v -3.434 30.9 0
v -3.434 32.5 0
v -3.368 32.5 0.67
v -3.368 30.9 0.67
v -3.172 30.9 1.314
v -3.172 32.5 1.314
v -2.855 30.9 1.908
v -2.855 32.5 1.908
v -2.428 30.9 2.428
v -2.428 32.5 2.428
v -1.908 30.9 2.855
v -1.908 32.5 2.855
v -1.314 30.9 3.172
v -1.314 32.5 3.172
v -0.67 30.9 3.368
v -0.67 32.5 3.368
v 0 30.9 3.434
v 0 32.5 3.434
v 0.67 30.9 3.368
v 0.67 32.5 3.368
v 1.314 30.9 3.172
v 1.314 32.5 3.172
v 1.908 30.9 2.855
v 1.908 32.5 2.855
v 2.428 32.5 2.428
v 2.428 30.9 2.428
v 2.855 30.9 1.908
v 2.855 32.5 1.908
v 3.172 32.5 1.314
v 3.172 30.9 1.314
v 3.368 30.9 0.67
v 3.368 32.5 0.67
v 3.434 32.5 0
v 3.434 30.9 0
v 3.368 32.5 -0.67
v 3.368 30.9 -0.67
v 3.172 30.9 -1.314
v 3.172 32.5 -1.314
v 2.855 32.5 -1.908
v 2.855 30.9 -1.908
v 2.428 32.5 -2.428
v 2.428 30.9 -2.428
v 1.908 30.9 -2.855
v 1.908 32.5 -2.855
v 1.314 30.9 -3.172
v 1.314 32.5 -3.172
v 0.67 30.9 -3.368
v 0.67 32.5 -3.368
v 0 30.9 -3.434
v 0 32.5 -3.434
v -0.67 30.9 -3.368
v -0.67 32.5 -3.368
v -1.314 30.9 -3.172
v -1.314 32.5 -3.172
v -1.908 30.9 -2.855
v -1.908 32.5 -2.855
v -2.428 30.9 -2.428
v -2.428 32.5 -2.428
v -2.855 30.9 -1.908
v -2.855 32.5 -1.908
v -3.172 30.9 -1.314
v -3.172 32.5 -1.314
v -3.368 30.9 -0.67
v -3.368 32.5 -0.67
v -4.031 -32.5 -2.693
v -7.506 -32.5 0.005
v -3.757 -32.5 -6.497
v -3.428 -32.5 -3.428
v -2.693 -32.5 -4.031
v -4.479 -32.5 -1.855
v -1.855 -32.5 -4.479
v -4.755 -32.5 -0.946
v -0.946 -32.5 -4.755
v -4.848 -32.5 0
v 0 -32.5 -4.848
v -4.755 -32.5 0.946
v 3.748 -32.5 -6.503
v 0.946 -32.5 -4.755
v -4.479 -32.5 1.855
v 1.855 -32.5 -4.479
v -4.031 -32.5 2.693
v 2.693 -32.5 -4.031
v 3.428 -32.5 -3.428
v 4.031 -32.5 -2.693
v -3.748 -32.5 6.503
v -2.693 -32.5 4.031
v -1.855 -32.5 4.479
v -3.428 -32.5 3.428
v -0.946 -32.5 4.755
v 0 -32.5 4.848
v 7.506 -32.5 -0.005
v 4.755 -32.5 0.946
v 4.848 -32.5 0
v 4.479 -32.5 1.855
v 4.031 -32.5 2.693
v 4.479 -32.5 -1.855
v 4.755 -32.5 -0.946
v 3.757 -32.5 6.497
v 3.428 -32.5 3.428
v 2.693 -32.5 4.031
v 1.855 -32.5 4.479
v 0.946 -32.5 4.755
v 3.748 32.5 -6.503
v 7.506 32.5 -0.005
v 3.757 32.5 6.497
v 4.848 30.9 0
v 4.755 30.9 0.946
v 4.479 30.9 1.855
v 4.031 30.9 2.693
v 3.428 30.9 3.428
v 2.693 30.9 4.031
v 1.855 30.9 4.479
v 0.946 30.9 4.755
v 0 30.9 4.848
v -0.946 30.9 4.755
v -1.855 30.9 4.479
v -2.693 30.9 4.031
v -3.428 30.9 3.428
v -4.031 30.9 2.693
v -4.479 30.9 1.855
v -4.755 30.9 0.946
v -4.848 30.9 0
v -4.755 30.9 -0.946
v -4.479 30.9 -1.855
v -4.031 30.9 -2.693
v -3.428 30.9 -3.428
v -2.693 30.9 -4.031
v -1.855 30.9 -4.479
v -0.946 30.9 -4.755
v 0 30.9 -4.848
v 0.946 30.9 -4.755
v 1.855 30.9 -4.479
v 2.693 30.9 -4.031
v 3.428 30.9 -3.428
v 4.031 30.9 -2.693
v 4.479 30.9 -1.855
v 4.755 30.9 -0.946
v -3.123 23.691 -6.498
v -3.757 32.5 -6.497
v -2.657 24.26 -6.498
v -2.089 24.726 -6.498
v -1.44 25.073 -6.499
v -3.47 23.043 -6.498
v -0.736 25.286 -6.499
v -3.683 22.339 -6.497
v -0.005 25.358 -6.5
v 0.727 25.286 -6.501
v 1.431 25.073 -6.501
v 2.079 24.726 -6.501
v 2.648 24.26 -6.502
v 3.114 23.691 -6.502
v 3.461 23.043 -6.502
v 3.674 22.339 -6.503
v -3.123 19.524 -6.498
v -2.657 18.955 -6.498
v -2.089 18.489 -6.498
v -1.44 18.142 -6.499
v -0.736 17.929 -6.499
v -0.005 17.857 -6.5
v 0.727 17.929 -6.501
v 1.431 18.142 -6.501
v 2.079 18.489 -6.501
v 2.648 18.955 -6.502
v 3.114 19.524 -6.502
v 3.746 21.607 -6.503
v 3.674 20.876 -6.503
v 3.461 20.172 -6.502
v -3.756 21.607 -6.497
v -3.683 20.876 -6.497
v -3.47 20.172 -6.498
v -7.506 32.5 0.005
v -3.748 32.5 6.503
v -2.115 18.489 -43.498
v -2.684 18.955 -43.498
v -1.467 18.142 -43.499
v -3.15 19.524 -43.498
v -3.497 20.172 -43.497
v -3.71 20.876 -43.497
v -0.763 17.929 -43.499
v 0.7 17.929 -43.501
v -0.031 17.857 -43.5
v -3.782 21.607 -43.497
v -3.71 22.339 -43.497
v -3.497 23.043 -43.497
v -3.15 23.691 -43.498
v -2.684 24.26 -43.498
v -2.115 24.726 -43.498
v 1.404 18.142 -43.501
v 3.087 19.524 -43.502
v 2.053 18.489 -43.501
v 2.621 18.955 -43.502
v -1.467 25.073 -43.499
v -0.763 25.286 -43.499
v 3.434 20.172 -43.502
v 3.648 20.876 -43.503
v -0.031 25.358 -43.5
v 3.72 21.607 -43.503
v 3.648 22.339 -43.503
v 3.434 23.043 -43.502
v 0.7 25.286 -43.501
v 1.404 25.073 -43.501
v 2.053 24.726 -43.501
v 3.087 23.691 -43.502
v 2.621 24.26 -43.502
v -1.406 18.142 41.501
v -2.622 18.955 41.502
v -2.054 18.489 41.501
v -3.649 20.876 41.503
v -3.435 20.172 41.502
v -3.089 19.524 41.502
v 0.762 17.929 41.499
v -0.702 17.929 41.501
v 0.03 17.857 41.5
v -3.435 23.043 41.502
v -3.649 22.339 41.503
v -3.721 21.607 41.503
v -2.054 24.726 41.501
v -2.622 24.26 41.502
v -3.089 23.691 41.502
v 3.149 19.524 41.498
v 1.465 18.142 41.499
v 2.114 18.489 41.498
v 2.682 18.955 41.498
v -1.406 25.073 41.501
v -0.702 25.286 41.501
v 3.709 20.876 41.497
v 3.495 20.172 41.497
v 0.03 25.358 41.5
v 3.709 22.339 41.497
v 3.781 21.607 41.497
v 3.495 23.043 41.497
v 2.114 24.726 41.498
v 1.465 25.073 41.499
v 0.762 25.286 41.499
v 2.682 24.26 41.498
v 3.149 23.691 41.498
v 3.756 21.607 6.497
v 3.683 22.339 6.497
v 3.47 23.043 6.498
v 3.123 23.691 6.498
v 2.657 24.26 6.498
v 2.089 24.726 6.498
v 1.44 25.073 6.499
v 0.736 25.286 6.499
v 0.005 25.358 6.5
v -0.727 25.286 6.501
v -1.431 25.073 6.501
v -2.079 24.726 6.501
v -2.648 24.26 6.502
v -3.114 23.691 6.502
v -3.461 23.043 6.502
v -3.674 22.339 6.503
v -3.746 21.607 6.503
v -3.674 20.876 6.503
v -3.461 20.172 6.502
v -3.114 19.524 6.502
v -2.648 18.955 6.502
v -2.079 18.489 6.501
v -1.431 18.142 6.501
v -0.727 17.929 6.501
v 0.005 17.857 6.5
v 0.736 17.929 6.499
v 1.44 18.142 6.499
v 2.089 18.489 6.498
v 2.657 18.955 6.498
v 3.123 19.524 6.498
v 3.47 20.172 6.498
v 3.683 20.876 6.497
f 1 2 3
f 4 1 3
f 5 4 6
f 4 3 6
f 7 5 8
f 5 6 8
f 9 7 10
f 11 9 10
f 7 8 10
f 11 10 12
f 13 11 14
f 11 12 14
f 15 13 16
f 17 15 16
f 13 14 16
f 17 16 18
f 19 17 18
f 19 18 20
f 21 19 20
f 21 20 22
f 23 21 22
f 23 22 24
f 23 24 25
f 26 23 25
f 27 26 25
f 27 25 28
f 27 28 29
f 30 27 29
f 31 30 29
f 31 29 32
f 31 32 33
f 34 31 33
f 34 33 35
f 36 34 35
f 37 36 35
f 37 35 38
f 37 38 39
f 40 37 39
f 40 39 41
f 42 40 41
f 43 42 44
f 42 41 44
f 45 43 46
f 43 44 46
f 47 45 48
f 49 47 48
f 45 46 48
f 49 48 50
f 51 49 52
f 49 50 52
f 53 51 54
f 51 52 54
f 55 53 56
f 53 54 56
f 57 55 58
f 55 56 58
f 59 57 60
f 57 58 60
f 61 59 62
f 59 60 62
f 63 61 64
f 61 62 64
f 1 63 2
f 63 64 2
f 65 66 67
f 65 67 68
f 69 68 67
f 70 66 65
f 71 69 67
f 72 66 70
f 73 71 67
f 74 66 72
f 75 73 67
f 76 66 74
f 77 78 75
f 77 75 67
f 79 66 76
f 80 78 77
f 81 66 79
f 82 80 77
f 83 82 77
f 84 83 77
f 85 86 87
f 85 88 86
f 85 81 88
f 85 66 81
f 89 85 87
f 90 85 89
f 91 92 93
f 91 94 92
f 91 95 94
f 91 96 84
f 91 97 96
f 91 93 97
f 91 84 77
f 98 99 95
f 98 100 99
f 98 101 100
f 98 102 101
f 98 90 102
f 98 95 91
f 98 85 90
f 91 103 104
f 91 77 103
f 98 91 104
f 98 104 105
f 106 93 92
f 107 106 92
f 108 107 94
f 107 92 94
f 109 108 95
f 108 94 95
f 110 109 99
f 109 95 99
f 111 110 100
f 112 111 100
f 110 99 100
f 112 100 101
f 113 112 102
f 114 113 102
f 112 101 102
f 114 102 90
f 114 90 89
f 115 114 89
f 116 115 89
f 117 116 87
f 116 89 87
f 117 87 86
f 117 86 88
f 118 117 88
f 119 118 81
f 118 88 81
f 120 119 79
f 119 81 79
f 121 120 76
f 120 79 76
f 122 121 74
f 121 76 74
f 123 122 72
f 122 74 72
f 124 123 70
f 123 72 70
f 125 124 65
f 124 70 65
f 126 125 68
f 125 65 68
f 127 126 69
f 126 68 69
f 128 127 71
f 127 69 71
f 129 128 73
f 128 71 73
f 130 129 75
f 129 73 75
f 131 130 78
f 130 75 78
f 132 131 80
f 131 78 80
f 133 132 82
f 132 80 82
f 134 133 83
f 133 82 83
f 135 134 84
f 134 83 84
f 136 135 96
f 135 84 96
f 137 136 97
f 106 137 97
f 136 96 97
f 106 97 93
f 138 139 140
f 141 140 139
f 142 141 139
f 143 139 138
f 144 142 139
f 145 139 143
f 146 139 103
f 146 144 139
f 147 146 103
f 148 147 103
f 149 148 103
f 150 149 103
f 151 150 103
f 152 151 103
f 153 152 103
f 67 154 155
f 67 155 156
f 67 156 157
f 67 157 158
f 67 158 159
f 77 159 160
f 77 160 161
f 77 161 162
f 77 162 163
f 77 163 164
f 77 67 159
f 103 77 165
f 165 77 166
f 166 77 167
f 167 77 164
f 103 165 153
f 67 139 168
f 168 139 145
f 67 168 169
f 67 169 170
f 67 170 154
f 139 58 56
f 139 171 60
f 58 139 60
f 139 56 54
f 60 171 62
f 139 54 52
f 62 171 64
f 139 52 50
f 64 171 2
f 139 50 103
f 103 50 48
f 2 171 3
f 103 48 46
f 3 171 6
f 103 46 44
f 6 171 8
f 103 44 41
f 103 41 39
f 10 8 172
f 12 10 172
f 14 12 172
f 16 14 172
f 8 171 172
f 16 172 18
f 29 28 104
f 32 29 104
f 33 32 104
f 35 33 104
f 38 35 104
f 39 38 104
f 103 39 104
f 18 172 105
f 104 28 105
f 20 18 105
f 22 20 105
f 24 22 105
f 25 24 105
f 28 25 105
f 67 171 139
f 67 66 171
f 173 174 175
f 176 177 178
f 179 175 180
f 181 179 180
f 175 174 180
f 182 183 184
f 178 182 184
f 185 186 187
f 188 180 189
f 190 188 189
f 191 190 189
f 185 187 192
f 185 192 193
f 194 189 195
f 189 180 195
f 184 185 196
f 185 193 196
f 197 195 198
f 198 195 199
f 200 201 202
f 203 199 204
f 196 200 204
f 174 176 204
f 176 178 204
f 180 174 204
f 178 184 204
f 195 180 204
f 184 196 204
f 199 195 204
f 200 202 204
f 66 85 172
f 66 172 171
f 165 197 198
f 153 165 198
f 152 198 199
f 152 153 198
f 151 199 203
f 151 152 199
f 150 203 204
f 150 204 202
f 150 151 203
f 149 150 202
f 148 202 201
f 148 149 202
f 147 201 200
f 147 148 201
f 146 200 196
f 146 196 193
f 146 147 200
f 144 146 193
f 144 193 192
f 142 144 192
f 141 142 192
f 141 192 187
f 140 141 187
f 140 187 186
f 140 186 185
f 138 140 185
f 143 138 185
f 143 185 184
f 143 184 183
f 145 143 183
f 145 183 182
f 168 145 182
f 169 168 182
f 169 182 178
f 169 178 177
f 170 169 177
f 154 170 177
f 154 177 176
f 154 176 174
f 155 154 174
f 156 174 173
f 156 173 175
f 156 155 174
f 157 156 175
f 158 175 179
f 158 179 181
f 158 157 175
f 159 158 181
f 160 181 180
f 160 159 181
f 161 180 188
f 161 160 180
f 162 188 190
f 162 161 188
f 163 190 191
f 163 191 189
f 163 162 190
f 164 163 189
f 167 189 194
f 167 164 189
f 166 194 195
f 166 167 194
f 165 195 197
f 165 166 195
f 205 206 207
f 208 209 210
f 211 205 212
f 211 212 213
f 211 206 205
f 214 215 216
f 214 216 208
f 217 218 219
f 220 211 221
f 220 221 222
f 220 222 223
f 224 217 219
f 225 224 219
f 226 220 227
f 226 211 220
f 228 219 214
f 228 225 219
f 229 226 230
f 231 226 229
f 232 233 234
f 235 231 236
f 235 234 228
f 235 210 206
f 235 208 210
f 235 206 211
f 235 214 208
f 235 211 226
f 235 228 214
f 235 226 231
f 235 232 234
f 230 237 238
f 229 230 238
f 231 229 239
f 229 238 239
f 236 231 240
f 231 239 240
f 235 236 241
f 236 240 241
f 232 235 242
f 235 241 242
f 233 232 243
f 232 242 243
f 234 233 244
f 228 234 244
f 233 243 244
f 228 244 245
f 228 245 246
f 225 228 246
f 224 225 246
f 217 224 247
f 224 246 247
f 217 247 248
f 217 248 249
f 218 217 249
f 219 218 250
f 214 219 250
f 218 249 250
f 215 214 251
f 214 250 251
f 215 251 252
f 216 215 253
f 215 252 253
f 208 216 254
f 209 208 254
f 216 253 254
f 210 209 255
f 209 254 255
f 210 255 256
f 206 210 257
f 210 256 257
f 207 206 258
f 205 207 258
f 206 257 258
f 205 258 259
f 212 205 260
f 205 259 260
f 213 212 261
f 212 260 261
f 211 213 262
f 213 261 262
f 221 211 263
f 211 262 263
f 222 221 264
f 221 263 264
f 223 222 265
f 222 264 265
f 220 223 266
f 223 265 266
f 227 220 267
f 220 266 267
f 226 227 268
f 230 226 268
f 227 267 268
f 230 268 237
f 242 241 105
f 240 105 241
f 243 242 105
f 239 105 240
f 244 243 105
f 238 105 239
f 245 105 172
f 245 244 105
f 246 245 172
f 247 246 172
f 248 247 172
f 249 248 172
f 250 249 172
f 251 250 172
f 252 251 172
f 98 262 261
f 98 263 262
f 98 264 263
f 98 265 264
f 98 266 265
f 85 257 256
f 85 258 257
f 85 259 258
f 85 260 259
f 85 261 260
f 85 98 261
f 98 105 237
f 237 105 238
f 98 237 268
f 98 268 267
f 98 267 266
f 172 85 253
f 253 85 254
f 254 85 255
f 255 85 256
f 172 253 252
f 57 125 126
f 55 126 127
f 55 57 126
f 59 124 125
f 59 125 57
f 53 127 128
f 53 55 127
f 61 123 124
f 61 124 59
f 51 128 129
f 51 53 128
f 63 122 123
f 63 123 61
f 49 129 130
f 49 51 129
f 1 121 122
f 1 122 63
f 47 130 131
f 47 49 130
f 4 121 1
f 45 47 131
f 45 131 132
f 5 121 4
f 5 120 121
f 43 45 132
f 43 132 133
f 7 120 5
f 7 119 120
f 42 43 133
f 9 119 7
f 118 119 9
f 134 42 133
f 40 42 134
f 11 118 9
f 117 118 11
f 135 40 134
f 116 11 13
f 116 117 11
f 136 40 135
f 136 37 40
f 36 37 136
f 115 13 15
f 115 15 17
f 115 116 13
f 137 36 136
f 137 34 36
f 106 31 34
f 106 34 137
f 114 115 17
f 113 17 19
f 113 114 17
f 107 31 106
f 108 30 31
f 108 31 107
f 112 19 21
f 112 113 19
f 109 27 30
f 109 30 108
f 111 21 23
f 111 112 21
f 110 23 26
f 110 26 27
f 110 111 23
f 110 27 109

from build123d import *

# Parameters (mm, degrees)
F1_DEPTH      = 32.5
F2_R          = 3.7508720601
F3_DEPTH      = 35
F3_DEPTH_BACK = 50
F4_R          = 4.8477507868
F5_DEPTH      = 63.4
F6_R          = 3.4336134654
F7_DEPTH      = 90


with BuildPart() as f1:
    # F0 (on Front) → F1 (new body, symmetric)
    with BuildSketch(Plane.XZ):
        Polygon((3.7480990784, -6.5026984116), (7.5055515568, -0.005400188), (3.7574524784, 6.4972982236), (-3.7480990784, 6.5026984116), (-7.5055515568, 0.005400188), (-3.7574524784, -6.4972982236), align=None)
    extrude(amount=F1_DEPTH, both=True)

    # F2 (on face) → F3 (join, two sides)
    with BuildSketch(Plane(origin=(0.0046767, 0, 6.4999983176), x_dir=(0.9999997412, 0, -0.0007194923), z_dir=(0.0007194923, 0, 0.9999997412))) as f3_sk:
        with Locations((0, 21.6074604541)):
            Circle(F2_R)
    extrude(amount=F3_DEPTH)
    extrude(f3_sk.sketch, amount=-F3_DEPTH_BACK)

    # F4 (on face) → F5 (cut)
    with BuildSketch(Plane.XZ.offset(32.5)):
        Circle(F4_R)
    extrude(amount=-F5_DEPTH, mode=Mode.SUBTRACT)

    # F6 (on face) → F7 (cut)
    with BuildSketch(Plane(origin=(0, 32.5, 0), x_dir=(-1, 0, 0), z_dir=(0, 1, 0))):
        Circle(F6_R)
    extrude(amount=-F7_DEPTH, mode=Mode.SUBTRACT)


solid = f1.part
